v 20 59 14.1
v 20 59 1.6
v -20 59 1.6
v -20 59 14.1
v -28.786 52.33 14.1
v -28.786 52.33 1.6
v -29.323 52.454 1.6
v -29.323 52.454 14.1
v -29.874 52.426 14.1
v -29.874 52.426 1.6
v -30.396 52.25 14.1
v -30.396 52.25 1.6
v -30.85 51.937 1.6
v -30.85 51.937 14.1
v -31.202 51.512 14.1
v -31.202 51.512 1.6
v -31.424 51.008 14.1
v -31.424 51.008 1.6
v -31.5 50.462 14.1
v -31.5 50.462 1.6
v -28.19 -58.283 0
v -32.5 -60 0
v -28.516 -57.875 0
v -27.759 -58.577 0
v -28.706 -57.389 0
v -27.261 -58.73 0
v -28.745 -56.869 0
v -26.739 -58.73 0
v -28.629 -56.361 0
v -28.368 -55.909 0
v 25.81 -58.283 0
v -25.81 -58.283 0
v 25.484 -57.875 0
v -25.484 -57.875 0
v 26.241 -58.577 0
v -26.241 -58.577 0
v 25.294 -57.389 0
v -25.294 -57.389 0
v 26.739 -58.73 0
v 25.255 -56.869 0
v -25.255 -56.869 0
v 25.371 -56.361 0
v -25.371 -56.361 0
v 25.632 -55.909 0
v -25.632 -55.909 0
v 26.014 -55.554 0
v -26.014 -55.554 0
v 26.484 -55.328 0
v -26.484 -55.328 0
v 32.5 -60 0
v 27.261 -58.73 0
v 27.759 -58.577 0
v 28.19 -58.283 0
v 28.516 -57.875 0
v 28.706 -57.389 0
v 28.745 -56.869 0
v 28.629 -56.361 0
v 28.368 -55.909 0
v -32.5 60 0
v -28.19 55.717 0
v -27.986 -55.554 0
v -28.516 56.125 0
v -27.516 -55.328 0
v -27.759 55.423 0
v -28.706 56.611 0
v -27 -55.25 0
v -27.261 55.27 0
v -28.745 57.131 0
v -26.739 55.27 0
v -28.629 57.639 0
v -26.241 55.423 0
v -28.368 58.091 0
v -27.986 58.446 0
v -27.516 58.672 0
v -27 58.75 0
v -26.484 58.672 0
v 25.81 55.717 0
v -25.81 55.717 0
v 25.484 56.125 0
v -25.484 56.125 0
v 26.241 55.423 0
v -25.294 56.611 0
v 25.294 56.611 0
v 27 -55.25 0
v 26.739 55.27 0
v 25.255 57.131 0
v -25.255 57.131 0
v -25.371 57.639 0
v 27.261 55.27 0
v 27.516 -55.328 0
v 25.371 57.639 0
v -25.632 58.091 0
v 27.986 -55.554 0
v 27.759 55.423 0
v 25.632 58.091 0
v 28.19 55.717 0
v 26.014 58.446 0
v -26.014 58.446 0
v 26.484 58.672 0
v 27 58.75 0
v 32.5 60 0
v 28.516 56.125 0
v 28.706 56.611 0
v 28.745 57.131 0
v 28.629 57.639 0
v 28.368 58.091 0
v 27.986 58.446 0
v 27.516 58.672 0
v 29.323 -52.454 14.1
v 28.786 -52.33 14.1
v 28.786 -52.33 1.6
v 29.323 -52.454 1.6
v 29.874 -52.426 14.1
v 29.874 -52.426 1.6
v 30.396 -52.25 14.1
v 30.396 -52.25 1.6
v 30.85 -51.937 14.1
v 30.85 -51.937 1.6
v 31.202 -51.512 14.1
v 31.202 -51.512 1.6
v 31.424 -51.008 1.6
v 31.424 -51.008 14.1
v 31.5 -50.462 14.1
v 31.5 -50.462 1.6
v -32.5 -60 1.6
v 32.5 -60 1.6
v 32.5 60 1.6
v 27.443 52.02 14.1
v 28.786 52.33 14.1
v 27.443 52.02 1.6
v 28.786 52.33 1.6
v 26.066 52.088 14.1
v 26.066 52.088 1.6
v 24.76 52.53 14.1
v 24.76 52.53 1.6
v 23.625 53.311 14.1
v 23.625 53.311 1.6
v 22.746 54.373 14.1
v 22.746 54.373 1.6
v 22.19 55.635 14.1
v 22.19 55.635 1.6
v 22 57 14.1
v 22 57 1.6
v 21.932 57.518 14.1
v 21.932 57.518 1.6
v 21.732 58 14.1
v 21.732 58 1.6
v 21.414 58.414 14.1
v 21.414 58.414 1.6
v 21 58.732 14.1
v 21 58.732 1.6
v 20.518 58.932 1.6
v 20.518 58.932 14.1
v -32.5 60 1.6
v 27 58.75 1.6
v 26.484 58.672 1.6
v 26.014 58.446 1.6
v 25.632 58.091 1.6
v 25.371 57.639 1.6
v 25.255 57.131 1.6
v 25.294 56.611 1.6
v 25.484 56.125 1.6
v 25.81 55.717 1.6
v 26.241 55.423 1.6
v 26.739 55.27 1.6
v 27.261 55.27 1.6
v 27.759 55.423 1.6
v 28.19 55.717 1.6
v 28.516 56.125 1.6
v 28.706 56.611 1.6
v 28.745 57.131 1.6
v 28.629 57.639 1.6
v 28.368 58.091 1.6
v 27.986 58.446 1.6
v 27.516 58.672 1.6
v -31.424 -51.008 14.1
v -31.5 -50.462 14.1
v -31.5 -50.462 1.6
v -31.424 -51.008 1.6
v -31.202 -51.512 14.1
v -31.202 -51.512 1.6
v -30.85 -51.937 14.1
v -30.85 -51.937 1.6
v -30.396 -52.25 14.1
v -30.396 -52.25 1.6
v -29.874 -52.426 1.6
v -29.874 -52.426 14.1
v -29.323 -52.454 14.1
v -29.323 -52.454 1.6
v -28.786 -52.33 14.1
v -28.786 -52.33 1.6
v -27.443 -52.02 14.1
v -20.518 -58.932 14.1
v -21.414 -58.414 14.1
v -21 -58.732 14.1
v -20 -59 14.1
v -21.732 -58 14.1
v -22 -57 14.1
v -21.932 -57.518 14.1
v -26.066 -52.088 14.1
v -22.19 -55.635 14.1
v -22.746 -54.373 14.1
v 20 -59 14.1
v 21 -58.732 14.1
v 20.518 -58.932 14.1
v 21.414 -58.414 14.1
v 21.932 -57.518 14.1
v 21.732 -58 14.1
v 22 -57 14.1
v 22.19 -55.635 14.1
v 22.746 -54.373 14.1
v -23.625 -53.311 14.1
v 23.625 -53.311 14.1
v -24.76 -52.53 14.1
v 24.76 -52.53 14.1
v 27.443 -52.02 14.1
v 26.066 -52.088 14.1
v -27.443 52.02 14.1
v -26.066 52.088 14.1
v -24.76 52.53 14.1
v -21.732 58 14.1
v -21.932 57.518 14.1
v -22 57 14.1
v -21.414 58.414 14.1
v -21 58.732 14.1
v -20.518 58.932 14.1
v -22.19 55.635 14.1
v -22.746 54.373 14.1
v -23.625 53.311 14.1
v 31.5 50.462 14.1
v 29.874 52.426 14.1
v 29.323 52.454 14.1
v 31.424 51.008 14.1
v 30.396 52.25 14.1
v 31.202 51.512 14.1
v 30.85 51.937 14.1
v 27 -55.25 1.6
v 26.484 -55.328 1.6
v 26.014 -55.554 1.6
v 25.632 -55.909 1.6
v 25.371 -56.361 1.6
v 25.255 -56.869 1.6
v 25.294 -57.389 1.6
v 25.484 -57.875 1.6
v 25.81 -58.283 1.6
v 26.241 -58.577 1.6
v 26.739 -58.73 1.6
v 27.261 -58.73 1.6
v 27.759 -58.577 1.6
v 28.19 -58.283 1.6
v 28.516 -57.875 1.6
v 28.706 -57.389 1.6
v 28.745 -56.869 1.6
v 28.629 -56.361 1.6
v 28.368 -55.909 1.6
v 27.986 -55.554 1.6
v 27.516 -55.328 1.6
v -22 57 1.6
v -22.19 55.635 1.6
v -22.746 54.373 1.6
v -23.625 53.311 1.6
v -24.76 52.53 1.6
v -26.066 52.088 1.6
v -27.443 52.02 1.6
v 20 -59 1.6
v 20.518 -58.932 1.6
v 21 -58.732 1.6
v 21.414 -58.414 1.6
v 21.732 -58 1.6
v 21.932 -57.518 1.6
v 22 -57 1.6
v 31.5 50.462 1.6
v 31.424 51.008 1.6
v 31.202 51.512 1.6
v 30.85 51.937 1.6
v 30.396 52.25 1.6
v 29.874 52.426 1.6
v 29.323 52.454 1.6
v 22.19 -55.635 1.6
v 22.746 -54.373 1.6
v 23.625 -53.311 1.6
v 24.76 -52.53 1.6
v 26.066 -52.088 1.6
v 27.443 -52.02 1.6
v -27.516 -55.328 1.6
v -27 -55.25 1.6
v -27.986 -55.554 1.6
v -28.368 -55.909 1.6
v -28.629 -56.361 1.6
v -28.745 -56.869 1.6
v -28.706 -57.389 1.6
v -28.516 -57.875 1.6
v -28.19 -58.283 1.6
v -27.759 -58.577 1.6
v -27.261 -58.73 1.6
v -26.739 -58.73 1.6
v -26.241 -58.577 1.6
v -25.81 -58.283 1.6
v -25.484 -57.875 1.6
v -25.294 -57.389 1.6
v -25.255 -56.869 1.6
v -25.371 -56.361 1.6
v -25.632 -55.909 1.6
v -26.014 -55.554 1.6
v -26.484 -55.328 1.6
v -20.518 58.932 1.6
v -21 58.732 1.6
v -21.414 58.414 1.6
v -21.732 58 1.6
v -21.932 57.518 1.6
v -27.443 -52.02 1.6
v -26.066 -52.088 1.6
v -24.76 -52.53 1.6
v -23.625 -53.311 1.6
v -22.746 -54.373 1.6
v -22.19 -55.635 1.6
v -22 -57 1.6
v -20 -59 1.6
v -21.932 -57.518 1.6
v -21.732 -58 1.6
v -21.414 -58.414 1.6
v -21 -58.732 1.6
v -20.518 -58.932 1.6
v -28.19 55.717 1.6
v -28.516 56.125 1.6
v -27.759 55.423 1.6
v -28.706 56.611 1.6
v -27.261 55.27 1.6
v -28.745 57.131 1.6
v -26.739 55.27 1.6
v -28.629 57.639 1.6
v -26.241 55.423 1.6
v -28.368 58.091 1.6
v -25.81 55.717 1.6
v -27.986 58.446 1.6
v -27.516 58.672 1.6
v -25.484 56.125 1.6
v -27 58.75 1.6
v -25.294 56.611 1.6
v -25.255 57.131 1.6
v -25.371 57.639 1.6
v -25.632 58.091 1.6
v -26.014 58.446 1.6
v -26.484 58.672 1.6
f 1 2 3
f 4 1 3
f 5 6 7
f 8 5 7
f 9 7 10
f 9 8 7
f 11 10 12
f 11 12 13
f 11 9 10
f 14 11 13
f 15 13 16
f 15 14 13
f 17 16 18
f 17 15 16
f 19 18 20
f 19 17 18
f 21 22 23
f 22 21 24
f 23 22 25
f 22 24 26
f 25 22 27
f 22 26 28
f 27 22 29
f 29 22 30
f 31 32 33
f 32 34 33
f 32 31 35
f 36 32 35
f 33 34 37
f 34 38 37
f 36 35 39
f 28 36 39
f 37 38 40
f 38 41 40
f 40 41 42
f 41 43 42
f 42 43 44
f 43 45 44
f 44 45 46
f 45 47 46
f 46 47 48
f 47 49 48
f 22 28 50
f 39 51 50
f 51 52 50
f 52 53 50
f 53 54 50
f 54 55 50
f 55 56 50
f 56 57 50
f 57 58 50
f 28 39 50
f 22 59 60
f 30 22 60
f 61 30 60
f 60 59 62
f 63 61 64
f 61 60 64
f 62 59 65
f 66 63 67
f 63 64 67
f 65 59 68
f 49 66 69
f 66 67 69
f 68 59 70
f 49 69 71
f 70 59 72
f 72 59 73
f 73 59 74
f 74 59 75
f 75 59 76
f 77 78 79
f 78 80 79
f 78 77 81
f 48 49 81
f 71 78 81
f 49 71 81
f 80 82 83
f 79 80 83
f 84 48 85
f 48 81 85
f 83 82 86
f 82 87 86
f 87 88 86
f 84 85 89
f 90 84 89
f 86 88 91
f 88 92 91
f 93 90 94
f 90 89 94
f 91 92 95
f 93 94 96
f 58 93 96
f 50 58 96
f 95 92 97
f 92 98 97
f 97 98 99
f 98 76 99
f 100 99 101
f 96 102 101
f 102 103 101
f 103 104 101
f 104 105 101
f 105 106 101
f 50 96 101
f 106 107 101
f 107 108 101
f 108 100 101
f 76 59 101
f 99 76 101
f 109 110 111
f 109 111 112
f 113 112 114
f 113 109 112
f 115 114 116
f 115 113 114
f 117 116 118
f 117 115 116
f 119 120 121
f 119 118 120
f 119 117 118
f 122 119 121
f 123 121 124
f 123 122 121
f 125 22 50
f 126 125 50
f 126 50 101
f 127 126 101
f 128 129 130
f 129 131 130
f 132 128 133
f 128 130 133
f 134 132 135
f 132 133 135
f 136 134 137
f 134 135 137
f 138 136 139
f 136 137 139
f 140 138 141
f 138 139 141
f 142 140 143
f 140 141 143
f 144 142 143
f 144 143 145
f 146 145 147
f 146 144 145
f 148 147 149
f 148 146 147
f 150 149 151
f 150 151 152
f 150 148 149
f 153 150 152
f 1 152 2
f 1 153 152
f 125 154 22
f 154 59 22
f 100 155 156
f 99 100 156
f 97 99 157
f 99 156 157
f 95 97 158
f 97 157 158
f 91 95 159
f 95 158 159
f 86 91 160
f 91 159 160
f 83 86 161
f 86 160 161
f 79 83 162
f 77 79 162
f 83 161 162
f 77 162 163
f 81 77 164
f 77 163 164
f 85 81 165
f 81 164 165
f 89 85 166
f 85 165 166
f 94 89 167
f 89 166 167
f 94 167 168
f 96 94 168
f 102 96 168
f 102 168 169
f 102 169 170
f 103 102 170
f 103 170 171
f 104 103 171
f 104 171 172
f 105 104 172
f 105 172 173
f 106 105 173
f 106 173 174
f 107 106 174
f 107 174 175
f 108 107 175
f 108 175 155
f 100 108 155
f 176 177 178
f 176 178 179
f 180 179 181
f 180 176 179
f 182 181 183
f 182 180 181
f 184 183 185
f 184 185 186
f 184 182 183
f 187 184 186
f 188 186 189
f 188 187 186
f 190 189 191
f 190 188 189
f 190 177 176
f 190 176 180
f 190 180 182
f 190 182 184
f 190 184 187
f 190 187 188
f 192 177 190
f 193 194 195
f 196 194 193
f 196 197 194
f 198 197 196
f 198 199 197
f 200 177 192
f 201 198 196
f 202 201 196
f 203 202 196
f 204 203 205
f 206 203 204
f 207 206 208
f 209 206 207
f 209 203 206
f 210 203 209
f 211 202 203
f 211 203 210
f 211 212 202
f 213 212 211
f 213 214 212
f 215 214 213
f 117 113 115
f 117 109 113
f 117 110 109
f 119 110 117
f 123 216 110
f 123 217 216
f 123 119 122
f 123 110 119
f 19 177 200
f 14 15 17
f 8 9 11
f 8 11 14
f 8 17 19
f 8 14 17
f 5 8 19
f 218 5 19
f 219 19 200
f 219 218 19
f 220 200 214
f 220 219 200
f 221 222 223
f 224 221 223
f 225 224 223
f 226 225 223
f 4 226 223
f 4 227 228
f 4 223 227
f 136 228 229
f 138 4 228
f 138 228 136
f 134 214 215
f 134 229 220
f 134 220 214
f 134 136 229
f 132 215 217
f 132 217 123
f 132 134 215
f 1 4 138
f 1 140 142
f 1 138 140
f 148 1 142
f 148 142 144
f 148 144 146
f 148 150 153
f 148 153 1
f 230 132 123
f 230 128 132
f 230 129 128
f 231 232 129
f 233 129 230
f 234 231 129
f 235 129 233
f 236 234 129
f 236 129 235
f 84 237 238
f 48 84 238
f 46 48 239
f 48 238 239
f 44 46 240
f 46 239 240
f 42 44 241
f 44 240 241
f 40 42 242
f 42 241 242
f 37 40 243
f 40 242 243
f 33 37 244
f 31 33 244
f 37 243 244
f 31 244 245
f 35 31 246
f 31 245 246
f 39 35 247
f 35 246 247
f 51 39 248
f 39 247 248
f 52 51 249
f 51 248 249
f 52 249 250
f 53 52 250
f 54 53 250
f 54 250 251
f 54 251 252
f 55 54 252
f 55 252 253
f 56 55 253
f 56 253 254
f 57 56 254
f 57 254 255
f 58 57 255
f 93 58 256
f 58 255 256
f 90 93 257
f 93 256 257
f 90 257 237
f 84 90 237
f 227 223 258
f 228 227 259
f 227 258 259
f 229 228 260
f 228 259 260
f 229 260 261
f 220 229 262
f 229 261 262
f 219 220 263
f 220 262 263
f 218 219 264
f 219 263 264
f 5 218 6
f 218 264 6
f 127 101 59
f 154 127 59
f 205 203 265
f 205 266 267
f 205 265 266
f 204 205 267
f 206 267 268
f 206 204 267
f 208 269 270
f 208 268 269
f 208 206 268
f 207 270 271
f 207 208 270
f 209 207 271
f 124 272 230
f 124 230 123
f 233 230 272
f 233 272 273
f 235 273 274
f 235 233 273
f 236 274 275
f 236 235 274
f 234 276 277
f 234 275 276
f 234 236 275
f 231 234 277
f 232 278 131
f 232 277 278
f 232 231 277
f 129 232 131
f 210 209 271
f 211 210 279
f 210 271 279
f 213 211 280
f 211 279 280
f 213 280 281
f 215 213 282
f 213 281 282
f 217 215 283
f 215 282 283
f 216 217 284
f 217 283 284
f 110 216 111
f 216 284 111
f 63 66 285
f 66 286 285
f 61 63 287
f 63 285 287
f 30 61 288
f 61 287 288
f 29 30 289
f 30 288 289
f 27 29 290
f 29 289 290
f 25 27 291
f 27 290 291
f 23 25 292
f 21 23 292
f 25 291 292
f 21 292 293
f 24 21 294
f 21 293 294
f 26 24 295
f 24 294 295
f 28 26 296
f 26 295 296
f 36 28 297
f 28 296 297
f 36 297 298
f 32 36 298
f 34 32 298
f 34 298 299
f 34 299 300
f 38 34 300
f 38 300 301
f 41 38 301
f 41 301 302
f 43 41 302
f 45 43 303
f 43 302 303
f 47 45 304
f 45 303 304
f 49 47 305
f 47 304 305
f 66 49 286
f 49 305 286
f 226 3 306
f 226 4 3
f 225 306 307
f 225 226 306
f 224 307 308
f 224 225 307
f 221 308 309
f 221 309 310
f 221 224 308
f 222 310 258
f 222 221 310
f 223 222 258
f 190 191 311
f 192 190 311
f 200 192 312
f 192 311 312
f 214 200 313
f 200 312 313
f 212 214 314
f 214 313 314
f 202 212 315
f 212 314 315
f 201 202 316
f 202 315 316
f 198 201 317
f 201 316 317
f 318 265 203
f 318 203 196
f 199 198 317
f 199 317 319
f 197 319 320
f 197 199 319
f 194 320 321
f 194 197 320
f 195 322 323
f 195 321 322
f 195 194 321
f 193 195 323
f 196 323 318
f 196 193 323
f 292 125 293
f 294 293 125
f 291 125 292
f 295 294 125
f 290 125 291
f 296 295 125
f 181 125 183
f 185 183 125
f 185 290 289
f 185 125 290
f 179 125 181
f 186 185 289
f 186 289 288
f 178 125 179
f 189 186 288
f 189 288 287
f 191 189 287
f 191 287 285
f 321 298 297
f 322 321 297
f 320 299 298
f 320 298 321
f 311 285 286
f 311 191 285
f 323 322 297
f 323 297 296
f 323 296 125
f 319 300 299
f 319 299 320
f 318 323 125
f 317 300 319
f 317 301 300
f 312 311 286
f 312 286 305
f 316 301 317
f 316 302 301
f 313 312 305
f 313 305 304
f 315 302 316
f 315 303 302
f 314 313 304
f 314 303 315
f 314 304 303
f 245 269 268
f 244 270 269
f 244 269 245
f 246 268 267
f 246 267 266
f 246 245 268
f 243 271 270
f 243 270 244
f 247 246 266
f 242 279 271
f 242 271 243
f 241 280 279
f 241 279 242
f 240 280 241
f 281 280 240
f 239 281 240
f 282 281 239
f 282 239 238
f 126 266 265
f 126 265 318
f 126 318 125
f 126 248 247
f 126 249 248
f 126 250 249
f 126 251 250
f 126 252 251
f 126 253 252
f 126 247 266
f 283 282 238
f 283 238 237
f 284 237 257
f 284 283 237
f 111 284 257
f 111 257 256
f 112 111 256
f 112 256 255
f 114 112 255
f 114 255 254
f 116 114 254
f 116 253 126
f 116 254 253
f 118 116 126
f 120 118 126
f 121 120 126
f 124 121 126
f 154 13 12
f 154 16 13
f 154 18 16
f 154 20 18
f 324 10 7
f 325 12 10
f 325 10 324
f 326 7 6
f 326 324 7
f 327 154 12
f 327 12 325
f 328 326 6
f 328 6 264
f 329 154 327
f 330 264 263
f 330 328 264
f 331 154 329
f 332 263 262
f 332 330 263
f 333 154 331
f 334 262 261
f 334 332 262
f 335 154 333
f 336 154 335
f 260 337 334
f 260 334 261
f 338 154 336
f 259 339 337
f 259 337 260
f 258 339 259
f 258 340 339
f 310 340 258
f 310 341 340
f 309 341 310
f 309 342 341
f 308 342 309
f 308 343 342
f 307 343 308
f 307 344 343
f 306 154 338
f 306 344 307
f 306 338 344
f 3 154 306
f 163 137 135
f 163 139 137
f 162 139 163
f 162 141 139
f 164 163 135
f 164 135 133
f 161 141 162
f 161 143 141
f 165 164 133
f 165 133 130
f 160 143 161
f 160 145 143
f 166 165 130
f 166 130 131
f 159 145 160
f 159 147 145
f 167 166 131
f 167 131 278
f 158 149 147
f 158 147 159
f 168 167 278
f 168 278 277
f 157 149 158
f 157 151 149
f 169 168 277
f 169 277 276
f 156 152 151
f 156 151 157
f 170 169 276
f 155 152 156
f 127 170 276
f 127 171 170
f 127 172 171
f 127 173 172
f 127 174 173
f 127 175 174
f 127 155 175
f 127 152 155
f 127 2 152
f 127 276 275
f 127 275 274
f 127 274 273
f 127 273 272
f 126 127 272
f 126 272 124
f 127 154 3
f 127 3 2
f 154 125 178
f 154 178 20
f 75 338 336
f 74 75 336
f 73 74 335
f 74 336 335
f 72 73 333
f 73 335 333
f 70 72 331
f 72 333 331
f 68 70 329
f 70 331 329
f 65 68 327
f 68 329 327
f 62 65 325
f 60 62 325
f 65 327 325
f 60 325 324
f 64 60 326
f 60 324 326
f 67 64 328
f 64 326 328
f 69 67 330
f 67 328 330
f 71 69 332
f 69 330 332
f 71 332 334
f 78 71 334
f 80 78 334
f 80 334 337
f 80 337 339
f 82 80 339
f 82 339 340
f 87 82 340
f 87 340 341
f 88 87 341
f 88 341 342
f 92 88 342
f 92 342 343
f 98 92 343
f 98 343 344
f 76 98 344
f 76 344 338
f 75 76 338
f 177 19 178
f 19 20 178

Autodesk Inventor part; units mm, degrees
ref_plane "YZ Plane" through (0, 0, 0) normal (1, 0, 0) x (0, 1, 0)
ref_plane "XZ Plane" through (0, 0, 0) normal (0, 1, 0) x (-1, 0, 0)
ref_plane "XY Plane" through (0, 0, 0) normal (0, 0, 1) x (1, 0, 0)
sketch "Sketch1" plane through (0, 0, 0) normal (0, 0, 1) x (1, 0, 0)
  line L0 (32.5, 60) -> (-32.5, 60)
  line L1 (-32.5, 60) -> (-32.5, -60)
  line L2 (-32.5, -60) -> (32.5, -60)
  line L3 (32.5, -60) -> (32.5, 60)
  line L4 (32.5, 60) -> (-32.5, -60) construction
  line L5 (-32.5, 60) -> (32.5, -60) construction
  line L6 (-27, 57) -> (27, 57) construction
  line L7 (27, 57) -> (27, -57) construction
  line L8 (27, -57) -> (-27, -57) construction
  line L9 (-27, -57) -> (-27, 57) construction
  line L10 (-27, 57) -> (27, -57) construction
  line L11 (27, 57) -> (-27, -57) construction
  arc A0 (22.4174, 59) -> (31.5, 54.8206) centre (27, 57) ccw
  line L12 (31.5, 54.8206) -> (31.5, -54.8206)
  line L13 (22.4174, 59) -> (-22.4174, 59)
  line L14 (32.5, 0) -> (-32.5, 0) construction
  line L15 (0, 60) -> (0, -60) construction
  arc A1 (31.5, -54.8206) -> (22.4174, -59) centre (27, -57) ccw
  line L16 (22.4174, -59) -> (-22.4174, -59)
  arc A2 (-31.5, 54.8206) -> (-22.4174, 59) centre (-27, 57) ccw
  line L17 (-31.5, 54.8206) -> (-31.5, -54.8206)
  arc A3 (-22.4174, -59) -> (-31.5, -54.8206) centre (-27, -57) ccw
  point P0 (0, 0)
  dimension "d0" = 65
  dimension "d1" = 120
  dimension "d2" = 5.5
  dimension "d3" = 3
  dimension "d4" = 1
  dimension "d5" = 1
  dimension "d6" = 5
extrude "Extrusion1" add sketch "Sketch1" along normal blind 1.6 contours L3 L2 L1 L0 | A0 L12 A1 L16 A3 L17 A2 L13
extrude "Extrusion2" add sketch "Sketch1" along normal blind 14.1 contours A0 L12 A1 L16 A3 L17 A2 L13
hole "Hole1" at (27, 57, 0) at (-27, 57, 0) at (-27, -57, 0) at (27, -57, 0) direction (0, 0, 1) diameter 3.5 end through all
fillet "Fillet1" radius 2 8 edges at (-22.4174, 59, 7.85) (-31.5, 54.8206, 7.85) (22.4174, 59, 7.85) (31.5, 54.8206, 7.85) (31.5, -54.8206, 7.85) (22.4174, -59, 7.85) (-22.4174, -59, 7.85) (-31.5, -54.8206, 7.85)
equation "\"d5\" = d4"
properties part number "SUSTAINA-CORE-BOARD" material "Acetal Resin, Black"
